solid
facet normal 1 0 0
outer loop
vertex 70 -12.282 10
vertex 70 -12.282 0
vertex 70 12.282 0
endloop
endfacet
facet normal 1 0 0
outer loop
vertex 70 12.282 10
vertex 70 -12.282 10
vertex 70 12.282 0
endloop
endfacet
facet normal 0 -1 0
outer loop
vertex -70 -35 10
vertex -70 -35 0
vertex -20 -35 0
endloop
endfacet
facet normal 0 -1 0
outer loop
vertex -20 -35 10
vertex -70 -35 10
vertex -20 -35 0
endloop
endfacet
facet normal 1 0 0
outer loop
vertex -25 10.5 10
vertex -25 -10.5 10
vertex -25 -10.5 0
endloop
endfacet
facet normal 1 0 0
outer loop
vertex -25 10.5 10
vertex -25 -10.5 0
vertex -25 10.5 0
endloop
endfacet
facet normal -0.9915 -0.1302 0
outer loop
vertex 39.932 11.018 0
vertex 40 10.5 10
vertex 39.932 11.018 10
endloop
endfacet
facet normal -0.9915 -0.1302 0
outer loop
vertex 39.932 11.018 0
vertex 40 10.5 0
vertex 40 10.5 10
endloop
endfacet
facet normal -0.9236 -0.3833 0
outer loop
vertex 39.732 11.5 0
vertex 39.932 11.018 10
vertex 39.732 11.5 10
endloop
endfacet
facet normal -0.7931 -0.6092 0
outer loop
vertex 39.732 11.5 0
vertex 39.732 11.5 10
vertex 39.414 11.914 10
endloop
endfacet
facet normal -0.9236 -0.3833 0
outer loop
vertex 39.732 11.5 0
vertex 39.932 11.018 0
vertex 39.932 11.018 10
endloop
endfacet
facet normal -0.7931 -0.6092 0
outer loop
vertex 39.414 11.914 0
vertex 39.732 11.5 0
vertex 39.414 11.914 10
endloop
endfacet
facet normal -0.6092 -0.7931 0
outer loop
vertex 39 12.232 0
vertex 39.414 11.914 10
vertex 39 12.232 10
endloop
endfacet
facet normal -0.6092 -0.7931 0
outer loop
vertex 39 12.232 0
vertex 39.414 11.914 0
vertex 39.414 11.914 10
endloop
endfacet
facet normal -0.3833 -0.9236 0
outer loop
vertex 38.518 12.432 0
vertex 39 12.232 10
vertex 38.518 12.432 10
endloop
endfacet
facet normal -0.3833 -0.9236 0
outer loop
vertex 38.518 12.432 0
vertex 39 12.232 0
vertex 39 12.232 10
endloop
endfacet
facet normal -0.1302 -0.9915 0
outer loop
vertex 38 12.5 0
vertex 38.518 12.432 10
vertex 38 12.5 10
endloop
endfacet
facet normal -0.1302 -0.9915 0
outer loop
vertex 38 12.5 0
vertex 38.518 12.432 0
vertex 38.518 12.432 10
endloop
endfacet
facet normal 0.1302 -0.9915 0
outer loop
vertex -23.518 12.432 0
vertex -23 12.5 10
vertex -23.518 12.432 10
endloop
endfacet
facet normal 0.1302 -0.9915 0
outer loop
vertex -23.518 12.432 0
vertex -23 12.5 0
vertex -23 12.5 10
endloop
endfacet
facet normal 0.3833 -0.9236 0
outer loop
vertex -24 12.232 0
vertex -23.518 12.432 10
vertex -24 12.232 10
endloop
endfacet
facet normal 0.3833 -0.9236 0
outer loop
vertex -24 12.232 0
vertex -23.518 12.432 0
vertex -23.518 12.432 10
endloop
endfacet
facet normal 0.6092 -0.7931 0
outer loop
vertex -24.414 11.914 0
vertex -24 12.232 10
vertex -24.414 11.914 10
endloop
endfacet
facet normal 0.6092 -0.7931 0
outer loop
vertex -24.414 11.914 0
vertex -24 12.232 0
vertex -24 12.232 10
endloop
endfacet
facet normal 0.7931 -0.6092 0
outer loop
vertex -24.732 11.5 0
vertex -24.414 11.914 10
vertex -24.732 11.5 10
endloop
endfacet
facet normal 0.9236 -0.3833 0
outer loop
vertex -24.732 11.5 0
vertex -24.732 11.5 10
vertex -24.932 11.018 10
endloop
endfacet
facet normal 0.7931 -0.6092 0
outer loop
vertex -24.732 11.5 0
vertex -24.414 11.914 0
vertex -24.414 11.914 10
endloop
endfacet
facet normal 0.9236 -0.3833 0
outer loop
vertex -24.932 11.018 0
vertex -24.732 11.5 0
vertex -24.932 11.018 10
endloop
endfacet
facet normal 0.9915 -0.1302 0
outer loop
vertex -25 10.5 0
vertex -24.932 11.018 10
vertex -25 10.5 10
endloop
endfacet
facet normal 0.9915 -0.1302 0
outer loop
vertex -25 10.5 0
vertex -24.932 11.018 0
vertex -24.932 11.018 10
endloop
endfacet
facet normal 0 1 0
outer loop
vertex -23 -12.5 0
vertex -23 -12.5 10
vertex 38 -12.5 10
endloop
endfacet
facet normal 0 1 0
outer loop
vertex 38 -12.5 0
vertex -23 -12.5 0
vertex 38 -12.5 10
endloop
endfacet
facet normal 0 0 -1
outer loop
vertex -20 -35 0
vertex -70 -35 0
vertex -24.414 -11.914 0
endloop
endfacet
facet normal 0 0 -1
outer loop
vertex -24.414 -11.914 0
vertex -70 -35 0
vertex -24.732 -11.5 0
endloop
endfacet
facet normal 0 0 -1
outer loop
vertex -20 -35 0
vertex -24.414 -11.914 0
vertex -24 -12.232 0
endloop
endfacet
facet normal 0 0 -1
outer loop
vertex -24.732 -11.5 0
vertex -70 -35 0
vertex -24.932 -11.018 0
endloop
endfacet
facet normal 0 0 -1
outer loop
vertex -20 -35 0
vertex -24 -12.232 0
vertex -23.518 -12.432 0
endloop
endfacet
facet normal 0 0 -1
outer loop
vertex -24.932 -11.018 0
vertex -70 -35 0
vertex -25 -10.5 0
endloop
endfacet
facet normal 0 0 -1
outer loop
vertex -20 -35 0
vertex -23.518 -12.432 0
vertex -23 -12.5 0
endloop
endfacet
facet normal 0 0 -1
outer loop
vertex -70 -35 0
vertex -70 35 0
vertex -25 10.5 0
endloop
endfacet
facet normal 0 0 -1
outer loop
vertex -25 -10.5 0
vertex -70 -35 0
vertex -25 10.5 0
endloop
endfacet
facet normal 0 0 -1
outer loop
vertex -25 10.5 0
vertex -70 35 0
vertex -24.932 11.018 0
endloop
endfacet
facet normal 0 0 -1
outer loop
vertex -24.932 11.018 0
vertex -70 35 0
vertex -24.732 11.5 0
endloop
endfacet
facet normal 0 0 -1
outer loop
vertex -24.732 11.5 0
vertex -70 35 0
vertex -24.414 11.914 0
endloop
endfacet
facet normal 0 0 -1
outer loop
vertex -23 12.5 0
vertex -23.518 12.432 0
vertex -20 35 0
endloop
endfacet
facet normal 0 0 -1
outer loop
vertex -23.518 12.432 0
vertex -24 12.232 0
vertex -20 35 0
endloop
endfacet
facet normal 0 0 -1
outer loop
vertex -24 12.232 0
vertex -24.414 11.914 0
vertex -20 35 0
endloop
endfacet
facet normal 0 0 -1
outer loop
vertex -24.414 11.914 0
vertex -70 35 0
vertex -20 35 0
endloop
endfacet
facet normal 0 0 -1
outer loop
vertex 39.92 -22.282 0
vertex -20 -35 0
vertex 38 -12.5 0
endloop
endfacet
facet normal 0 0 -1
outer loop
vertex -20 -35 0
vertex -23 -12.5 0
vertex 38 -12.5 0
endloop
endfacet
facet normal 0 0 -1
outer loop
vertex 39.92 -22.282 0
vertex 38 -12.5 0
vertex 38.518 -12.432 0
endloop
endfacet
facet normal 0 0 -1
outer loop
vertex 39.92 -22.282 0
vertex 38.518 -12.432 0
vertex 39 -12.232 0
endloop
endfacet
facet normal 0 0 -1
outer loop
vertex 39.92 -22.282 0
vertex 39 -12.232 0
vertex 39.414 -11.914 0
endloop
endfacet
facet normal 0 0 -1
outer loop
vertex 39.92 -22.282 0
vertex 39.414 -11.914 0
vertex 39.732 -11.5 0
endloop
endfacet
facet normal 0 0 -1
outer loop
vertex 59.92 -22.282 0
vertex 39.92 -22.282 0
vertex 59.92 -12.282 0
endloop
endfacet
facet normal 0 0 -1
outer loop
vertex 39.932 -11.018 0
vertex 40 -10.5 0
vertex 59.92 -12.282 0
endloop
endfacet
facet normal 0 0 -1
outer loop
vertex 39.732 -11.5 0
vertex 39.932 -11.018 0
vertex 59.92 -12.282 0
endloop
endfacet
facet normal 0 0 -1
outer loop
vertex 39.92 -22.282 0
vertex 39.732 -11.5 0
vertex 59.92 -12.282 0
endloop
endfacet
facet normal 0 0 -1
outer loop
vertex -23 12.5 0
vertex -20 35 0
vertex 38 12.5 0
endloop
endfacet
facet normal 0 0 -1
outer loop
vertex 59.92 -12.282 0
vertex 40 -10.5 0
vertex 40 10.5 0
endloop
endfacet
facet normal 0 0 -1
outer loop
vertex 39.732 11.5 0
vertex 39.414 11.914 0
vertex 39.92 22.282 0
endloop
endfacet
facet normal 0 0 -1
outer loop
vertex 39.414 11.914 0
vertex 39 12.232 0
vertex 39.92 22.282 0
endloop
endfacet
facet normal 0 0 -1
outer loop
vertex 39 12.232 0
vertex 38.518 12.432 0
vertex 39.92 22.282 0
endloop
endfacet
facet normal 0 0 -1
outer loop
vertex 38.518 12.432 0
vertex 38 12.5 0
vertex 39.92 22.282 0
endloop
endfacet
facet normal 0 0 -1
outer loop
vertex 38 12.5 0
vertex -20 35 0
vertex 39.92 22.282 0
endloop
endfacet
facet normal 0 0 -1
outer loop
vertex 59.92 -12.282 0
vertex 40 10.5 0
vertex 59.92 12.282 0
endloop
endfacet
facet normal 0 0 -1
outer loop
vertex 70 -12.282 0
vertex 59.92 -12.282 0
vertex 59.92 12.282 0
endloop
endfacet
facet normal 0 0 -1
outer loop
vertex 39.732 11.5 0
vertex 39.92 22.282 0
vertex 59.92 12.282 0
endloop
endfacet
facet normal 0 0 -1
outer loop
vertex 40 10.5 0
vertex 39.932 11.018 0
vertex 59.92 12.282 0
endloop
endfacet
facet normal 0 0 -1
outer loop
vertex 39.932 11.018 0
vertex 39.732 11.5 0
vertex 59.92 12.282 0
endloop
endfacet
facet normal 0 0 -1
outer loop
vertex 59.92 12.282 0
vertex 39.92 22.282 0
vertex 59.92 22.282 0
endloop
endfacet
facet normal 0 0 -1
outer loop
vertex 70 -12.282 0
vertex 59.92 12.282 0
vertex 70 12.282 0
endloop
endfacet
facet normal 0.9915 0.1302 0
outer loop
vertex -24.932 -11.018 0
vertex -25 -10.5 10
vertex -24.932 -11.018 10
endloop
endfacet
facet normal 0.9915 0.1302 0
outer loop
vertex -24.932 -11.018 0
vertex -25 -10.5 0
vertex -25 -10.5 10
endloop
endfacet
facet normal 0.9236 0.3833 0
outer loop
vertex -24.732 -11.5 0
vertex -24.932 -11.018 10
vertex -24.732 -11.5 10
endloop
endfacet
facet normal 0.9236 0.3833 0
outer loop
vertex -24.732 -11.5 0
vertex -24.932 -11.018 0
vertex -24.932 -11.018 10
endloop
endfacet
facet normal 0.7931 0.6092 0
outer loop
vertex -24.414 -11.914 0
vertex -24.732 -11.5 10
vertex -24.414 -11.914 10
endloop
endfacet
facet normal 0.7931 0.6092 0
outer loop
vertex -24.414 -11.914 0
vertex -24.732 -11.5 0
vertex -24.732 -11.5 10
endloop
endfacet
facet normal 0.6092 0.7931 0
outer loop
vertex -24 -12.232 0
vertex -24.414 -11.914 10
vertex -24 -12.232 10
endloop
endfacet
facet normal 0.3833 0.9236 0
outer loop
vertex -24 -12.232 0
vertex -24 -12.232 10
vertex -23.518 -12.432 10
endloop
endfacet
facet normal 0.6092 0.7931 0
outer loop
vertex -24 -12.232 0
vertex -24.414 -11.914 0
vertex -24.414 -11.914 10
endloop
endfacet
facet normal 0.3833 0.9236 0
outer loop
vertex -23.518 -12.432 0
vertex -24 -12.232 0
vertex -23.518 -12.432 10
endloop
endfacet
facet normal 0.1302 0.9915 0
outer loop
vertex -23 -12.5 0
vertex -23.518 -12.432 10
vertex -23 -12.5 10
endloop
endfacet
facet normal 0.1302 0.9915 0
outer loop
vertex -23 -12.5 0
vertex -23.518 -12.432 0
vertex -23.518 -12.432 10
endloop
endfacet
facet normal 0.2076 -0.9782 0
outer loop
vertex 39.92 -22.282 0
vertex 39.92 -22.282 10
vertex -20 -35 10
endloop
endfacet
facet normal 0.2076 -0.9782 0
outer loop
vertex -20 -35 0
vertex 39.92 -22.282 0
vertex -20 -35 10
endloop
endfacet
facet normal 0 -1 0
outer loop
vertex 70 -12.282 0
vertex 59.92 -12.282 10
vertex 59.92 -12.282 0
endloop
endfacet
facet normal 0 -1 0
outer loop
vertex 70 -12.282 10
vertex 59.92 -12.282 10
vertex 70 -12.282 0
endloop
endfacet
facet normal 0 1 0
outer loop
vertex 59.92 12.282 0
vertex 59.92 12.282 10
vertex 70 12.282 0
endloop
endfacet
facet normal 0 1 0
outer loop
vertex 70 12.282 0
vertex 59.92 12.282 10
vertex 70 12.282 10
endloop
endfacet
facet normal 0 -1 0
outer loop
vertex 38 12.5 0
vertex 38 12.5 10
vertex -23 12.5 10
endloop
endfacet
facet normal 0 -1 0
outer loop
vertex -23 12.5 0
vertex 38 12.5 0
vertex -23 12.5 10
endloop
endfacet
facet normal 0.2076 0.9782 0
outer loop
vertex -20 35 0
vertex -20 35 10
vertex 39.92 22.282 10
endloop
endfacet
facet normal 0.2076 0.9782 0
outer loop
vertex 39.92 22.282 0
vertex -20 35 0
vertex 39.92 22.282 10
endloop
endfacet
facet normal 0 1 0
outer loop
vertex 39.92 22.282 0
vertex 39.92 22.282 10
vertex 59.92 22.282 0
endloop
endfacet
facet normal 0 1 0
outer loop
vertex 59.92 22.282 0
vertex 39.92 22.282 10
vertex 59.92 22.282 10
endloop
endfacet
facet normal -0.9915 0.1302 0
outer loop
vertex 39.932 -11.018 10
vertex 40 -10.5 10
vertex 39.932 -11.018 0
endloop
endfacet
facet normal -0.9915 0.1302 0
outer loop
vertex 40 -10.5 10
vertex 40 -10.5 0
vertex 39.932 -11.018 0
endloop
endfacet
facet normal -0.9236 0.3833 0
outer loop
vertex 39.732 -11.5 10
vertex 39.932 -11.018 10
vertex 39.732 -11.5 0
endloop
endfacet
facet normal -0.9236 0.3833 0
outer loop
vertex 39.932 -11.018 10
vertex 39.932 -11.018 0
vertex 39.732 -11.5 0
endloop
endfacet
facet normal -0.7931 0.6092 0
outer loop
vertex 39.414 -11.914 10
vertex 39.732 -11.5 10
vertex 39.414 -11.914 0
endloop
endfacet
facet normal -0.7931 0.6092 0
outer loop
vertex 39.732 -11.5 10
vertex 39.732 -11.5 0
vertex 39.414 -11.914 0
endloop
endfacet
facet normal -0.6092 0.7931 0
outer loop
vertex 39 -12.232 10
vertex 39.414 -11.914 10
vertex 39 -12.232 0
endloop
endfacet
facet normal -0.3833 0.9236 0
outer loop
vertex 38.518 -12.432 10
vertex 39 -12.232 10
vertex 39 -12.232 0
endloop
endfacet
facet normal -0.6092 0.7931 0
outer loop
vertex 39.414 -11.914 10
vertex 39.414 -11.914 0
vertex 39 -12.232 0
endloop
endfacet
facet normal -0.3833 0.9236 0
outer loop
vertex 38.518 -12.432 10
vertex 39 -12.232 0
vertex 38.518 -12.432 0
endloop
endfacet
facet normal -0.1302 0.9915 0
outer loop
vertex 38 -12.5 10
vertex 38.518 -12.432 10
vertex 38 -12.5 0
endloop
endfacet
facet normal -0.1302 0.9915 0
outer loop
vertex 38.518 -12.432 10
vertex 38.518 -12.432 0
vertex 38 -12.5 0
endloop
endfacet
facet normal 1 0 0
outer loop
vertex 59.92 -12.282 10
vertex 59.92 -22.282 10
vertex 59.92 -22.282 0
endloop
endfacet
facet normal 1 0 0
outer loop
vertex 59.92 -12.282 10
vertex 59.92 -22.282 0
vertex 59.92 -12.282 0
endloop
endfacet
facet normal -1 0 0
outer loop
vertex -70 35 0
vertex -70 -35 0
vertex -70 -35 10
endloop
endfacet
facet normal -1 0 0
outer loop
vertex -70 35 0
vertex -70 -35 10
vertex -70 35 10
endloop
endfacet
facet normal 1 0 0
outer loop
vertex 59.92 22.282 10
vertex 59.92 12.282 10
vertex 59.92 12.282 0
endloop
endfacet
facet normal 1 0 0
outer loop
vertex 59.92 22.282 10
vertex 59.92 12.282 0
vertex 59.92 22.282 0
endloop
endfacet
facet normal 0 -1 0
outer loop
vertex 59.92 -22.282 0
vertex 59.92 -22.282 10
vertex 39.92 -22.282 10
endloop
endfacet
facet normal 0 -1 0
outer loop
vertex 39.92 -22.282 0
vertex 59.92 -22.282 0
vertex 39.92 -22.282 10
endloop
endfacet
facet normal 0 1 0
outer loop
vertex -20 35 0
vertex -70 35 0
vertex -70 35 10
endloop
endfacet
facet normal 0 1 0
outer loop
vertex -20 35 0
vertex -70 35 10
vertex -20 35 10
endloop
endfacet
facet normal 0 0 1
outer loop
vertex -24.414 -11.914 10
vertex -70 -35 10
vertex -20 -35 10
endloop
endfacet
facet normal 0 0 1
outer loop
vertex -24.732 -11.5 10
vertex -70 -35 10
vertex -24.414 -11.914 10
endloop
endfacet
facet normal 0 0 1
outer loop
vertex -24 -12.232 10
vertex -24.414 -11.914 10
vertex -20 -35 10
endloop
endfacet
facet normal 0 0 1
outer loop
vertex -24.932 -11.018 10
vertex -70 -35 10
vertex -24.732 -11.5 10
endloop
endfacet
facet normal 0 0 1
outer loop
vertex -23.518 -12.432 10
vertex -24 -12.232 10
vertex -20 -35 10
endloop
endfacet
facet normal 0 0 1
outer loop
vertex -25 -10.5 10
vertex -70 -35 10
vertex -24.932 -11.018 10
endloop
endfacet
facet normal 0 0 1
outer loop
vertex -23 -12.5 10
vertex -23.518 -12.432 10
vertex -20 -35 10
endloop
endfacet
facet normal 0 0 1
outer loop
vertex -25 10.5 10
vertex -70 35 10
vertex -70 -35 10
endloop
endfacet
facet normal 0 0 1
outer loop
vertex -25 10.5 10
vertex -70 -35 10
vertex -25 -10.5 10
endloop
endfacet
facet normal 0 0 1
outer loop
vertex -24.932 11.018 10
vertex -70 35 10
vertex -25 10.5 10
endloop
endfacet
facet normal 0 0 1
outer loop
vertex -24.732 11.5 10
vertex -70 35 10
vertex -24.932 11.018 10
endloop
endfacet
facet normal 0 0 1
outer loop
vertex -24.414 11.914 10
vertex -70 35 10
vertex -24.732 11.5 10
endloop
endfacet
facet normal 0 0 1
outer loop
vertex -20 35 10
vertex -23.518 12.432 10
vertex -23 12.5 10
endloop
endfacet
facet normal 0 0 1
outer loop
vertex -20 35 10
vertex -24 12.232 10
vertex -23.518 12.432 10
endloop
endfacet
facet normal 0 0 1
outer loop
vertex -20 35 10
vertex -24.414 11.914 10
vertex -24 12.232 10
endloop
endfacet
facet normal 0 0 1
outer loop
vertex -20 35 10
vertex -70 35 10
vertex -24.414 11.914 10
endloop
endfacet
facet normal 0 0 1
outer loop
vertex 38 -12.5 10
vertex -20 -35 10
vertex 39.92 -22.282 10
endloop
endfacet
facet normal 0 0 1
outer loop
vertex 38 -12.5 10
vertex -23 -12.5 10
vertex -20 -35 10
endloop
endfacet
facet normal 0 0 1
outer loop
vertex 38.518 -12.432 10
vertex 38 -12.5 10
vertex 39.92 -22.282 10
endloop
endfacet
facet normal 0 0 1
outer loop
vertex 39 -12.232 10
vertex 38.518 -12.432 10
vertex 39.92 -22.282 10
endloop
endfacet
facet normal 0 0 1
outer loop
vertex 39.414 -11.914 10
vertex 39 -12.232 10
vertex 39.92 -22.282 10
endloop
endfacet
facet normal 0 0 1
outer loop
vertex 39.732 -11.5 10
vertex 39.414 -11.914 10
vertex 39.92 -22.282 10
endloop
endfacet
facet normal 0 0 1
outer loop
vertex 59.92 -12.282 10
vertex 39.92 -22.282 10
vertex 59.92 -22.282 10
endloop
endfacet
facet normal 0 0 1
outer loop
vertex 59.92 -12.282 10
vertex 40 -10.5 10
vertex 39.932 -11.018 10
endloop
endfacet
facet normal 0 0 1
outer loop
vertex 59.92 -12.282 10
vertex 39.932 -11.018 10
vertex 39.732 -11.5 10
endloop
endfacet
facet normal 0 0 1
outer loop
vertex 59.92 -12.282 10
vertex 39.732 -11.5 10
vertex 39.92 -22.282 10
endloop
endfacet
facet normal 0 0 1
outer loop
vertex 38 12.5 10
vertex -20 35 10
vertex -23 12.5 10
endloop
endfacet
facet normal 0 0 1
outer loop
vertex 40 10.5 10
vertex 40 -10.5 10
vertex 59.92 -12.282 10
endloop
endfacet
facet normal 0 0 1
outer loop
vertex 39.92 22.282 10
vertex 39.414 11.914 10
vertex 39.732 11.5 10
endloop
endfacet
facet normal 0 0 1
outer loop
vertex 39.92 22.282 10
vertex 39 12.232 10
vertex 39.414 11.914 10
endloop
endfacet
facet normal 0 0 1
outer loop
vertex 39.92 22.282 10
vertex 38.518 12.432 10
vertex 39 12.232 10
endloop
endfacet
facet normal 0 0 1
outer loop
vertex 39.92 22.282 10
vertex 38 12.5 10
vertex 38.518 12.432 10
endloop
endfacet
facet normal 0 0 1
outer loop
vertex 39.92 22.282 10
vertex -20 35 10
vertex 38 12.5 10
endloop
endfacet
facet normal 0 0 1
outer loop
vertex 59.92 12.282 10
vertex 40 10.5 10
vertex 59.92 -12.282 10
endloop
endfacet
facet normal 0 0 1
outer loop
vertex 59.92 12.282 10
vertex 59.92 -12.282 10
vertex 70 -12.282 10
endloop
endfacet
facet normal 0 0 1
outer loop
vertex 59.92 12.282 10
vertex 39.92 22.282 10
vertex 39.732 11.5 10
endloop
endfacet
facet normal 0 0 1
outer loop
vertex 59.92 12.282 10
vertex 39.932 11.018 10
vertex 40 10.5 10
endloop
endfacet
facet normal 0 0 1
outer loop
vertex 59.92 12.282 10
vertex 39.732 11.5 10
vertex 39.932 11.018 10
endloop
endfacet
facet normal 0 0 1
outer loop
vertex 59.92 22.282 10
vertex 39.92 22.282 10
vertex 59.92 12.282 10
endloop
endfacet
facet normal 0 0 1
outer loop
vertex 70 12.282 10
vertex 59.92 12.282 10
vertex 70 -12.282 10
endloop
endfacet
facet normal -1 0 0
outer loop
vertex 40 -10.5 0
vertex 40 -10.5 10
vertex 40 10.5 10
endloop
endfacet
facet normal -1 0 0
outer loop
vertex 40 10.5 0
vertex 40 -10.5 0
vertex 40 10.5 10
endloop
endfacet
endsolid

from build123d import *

# Parameters (mm, degrees)
SKETCH_1_W          = 140
SKETCH_1_H          = 70
EXTRUDE_2_DEPTH     = 10
SKETCH_2_W          = 10.079720787
SKETCH_2_H          = 10
SKETCH_2_W_2        = 5
SKETCH_2_H_2        = 25
CUT_EXTRUDE_2_DEPTH = 10
FILLET_1_R          = 2


with BuildPart() as part:
    # 草图1 → 凸台-拉伸2 (new body)
    with BuildSketch(Plane.XY):
        Rectangle(SKETCH_1_W, SKETCH_1_H)
    extrude(amount=EXTRUDE_2_DEPTH)

    # 草图2 → 切除-拉伸2 (cut)
    with BuildSketch(Plane.XY.offset(10)):
        Polygon((39.920279213, 22.281959867), (59.920279213, 22.281959867), (70, 22.281959867), (70, 35), (-20, 35), align=None)
        with Locations((64.960139607, 17.281959867)):
            Rectangle(SKETCH_2_W, SKETCH_2_H)
        with Locations((64.960139607, -17.281959867)):
            Rectangle(SKETCH_2_W, SKETCH_2_H)
        Polygon((70, -22.281959867), (59.920279213, -22.281959867), (39.920279213, -22.281959867), (-20, -35), (70, -35), align=None)
        Polygon((40, -12.5), (40, 0), (40, 12.5), (-20, 12.5), (-20, -12.5), align=None)
        with Locations((-22.5, 0)):
            Rectangle(SKETCH_2_W_2, SKETCH_2_H_2)
    extrude(amount=-CUT_EXTRUDE_2_DEPTH, mode=Mode.SUBTRACT)

    # 圆角1
    fillet_1_edges = [part.edges().sort_by_distance(p)[0] for p in [
        (40, -12.5, 5),
        (-25, -12.5, 5),
        (-25, 12.5, 5),
        (40, 12.5, 5),
    ]]
    fillet(fillet_1_edges, radius=FILLET_1_R)


solid = part.part
